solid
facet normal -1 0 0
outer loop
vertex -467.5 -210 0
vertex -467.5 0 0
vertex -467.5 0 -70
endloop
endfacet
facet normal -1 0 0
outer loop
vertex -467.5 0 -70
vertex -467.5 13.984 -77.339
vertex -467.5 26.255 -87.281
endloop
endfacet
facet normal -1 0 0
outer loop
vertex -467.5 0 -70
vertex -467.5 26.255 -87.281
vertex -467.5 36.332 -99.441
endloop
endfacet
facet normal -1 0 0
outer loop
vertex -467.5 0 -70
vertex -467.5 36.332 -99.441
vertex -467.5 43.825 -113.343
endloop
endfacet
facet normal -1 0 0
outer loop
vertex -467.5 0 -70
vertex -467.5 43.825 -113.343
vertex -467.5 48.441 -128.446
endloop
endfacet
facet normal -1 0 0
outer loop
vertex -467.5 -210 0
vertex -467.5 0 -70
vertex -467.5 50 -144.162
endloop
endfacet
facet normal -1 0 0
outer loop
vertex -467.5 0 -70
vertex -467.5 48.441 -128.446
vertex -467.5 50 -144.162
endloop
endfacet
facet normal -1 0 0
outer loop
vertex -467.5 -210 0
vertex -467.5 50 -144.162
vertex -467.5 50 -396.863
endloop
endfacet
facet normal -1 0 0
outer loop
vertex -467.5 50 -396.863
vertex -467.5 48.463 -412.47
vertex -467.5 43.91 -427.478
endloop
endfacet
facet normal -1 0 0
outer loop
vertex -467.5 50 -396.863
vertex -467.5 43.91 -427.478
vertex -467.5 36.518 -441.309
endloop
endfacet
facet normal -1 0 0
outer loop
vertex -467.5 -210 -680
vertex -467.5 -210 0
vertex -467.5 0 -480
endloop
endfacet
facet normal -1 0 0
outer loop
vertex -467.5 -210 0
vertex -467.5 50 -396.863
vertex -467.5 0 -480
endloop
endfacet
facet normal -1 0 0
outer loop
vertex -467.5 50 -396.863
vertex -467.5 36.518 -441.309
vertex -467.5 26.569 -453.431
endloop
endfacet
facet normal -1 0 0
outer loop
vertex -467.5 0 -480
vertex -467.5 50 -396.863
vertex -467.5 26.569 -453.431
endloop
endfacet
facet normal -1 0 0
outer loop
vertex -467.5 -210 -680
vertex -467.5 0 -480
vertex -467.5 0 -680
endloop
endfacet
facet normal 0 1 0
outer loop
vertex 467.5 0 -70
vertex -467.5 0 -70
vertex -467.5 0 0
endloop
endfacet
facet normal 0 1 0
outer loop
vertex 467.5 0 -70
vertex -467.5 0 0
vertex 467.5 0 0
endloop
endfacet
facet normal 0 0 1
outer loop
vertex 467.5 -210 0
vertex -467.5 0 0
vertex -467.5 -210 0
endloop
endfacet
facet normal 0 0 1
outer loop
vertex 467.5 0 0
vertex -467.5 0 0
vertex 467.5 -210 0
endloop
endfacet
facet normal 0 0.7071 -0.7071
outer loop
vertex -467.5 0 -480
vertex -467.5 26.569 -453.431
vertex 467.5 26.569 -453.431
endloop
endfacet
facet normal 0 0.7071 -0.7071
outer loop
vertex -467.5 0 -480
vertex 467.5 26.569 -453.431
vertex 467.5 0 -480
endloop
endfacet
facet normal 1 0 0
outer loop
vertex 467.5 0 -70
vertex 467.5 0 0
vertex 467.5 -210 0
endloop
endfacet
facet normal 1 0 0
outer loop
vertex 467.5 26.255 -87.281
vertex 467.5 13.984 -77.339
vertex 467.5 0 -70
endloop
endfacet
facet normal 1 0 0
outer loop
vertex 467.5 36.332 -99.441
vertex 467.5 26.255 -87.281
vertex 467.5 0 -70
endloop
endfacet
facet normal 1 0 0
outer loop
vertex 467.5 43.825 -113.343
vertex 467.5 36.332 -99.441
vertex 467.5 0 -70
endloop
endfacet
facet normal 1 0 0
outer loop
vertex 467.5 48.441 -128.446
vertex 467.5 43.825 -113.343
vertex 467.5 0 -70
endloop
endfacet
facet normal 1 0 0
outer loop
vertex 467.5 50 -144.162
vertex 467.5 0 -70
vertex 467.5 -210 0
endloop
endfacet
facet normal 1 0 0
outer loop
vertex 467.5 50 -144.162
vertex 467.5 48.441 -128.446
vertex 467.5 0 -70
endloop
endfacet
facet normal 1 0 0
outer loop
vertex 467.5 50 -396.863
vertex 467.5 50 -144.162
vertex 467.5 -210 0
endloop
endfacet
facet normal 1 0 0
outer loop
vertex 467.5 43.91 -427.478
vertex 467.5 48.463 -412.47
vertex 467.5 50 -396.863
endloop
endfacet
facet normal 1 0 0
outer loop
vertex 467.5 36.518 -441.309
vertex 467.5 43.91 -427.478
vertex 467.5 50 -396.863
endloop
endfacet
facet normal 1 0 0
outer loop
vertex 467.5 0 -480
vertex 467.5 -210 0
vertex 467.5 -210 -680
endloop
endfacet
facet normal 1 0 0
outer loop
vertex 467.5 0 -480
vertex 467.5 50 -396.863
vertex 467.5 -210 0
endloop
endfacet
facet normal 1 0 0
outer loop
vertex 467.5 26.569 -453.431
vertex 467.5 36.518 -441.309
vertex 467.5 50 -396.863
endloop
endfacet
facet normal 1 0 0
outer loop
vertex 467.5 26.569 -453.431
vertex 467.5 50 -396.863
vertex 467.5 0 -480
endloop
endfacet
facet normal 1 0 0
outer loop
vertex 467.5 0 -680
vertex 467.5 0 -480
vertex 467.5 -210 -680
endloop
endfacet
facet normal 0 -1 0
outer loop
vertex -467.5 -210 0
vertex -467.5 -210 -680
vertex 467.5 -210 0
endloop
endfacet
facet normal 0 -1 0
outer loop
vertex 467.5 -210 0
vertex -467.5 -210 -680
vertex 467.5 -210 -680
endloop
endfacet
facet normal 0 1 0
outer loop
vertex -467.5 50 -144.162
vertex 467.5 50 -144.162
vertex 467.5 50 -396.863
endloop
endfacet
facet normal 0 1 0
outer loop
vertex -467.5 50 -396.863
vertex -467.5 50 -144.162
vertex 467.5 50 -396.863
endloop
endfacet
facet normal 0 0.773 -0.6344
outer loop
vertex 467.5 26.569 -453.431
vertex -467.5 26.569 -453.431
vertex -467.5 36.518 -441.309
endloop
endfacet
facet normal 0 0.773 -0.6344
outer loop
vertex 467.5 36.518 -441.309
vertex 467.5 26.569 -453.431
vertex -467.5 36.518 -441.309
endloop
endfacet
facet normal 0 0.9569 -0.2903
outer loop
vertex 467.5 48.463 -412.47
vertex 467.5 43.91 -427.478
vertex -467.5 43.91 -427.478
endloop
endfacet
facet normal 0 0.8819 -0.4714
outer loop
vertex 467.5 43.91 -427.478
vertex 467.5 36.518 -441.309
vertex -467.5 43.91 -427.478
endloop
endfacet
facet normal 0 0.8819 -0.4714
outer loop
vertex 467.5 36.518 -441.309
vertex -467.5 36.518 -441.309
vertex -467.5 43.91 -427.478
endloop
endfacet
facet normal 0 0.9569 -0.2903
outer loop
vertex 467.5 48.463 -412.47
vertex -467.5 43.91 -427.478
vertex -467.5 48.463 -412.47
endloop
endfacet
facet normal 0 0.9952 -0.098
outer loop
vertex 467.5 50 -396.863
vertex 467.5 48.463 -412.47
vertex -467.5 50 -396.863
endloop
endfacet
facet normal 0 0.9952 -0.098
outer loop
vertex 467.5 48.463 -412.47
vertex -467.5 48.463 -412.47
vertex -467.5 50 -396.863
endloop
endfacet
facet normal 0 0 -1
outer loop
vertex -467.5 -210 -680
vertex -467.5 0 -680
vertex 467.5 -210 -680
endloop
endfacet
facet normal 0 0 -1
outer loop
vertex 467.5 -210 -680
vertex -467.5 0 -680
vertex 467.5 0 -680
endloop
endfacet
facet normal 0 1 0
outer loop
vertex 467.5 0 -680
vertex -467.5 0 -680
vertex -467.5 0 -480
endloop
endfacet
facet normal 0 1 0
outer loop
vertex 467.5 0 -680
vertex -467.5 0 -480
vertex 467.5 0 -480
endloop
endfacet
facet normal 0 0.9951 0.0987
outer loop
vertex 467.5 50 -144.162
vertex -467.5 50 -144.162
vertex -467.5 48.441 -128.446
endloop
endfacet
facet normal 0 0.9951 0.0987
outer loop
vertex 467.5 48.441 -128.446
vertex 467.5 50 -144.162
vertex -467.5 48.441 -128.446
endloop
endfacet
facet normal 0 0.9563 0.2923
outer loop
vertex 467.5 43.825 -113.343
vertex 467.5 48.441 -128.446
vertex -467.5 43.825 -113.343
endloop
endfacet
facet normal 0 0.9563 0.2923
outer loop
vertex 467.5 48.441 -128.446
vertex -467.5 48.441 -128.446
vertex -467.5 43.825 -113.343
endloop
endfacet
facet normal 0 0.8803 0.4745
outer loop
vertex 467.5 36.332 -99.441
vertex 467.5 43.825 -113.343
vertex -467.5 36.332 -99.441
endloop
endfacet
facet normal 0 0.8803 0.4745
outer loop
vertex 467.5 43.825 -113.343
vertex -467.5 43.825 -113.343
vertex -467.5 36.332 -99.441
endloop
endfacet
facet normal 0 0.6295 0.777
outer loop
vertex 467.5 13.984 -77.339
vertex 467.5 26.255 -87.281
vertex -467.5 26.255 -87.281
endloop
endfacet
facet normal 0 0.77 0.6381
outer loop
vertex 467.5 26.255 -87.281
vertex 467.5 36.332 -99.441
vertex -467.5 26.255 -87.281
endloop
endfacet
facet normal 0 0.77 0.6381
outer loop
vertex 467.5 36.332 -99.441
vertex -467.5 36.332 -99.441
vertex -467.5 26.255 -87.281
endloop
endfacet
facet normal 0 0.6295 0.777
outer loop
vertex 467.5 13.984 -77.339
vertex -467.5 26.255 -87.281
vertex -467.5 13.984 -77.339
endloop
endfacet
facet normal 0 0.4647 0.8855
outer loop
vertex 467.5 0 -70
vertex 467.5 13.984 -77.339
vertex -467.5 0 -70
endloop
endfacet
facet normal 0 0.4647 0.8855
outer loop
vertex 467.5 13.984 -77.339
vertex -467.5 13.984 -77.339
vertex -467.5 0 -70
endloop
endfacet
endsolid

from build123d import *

# Parameters (mm, degrees)
SKETCH1_W           = 935
SKETCH1_H           = 680
BOSS_EXTRUDE1_DEPTH = 210
BOSS_EXTRUDE2_DEPTH = 935
FILLET1_R           = 80


with BuildPart() as part:
    # Sketch1 → Boss-Extrude1 (new body)
    with BuildSketch(Plane(origin=(0, 0, 0), x_dir=(1, 0, 0), z_dir=(0, 1, 0))):
        with Locations((0, 340)):
            Rectangle(SKETCH1_W, SKETCH1_H)
    extrude(amount=-BOSS_EXTRUDE1_DEPTH)

    # Sketch3 → Boss-Extrude2 (add)
    with BuildSketch(Plane.ZY.offset(467.5)):
        Polygon((-70, 0), (-70, 50), (-430, 50), (-480, 0), align=None)
    extrude(amount=-BOSS_EXTRUDE2_DEPTH)

    # Fillet1
    # the kernel refuses this fillet: 80 mm, written as the material it takes off along each edge
    with BuildSketch(Plane(origin=(-652.904962177, 50, -70), x_dir=(0, -1, 0), z_dir=(1, 0, 0))) as fillet1_piece_1:
        with BuildLine():
            CenterArc((80, 74.161984871), FILLET1_R, 180, 67.975687163)
            Line((0, 74.161984871), (-1.6, 74.161984871))
            Line((-1.6, 74.161984871), (-1.6, 0))
            Line((-1.6, 0), (0, -1.6))
            ThreePointArc((0, -1.6), (25, -1.6), (49.4, -1.483239697))
            Line((49.4, -1.483239697), (50, 0))
        make_face()
    extrude(amount=1305.809924355, mode=Mode.SUBTRACT)
    with BuildSketch(Plane(origin=(-550.342712475, 50, -430), x_dir=(0, -0.7071067811865477, -0.7071067811865474), z_dir=(1, 0, 0))) as fillet1_piece_2:
        with BuildLine():
            CenterArc((FILLET1_R * 0.414213562373, -FILLET1_R), FILLET1_R, 90, 45)
            Line((-FILLET1_R * 0.292893218813, -FILLET1_R * 0.292893218813), (-FILLET1_R * 0.307035354437, -FILLET1_R * 0.27875108319))
            Line((-FILLET1_R * 0.307035354437, -FILLET1_R * 0.27875108319), (-FILLET1_R * 0.00828427124746, FILLET1_R * 0.02))
            Line((-FILLET1_R * 0.00828427124746, FILLET1_R * 0.02), (FILLET1_R * 0.414213562373, FILLET1_R * 0.02))
            Line((FILLET1_R * 0.414213562373, FILLET1_R * 0.02), (FILLET1_R * 0.414213562373, 0))
        make_face()
    extrude(amount=1100.685424949, mode=Mode.SUBTRACT)


solid = part.part
